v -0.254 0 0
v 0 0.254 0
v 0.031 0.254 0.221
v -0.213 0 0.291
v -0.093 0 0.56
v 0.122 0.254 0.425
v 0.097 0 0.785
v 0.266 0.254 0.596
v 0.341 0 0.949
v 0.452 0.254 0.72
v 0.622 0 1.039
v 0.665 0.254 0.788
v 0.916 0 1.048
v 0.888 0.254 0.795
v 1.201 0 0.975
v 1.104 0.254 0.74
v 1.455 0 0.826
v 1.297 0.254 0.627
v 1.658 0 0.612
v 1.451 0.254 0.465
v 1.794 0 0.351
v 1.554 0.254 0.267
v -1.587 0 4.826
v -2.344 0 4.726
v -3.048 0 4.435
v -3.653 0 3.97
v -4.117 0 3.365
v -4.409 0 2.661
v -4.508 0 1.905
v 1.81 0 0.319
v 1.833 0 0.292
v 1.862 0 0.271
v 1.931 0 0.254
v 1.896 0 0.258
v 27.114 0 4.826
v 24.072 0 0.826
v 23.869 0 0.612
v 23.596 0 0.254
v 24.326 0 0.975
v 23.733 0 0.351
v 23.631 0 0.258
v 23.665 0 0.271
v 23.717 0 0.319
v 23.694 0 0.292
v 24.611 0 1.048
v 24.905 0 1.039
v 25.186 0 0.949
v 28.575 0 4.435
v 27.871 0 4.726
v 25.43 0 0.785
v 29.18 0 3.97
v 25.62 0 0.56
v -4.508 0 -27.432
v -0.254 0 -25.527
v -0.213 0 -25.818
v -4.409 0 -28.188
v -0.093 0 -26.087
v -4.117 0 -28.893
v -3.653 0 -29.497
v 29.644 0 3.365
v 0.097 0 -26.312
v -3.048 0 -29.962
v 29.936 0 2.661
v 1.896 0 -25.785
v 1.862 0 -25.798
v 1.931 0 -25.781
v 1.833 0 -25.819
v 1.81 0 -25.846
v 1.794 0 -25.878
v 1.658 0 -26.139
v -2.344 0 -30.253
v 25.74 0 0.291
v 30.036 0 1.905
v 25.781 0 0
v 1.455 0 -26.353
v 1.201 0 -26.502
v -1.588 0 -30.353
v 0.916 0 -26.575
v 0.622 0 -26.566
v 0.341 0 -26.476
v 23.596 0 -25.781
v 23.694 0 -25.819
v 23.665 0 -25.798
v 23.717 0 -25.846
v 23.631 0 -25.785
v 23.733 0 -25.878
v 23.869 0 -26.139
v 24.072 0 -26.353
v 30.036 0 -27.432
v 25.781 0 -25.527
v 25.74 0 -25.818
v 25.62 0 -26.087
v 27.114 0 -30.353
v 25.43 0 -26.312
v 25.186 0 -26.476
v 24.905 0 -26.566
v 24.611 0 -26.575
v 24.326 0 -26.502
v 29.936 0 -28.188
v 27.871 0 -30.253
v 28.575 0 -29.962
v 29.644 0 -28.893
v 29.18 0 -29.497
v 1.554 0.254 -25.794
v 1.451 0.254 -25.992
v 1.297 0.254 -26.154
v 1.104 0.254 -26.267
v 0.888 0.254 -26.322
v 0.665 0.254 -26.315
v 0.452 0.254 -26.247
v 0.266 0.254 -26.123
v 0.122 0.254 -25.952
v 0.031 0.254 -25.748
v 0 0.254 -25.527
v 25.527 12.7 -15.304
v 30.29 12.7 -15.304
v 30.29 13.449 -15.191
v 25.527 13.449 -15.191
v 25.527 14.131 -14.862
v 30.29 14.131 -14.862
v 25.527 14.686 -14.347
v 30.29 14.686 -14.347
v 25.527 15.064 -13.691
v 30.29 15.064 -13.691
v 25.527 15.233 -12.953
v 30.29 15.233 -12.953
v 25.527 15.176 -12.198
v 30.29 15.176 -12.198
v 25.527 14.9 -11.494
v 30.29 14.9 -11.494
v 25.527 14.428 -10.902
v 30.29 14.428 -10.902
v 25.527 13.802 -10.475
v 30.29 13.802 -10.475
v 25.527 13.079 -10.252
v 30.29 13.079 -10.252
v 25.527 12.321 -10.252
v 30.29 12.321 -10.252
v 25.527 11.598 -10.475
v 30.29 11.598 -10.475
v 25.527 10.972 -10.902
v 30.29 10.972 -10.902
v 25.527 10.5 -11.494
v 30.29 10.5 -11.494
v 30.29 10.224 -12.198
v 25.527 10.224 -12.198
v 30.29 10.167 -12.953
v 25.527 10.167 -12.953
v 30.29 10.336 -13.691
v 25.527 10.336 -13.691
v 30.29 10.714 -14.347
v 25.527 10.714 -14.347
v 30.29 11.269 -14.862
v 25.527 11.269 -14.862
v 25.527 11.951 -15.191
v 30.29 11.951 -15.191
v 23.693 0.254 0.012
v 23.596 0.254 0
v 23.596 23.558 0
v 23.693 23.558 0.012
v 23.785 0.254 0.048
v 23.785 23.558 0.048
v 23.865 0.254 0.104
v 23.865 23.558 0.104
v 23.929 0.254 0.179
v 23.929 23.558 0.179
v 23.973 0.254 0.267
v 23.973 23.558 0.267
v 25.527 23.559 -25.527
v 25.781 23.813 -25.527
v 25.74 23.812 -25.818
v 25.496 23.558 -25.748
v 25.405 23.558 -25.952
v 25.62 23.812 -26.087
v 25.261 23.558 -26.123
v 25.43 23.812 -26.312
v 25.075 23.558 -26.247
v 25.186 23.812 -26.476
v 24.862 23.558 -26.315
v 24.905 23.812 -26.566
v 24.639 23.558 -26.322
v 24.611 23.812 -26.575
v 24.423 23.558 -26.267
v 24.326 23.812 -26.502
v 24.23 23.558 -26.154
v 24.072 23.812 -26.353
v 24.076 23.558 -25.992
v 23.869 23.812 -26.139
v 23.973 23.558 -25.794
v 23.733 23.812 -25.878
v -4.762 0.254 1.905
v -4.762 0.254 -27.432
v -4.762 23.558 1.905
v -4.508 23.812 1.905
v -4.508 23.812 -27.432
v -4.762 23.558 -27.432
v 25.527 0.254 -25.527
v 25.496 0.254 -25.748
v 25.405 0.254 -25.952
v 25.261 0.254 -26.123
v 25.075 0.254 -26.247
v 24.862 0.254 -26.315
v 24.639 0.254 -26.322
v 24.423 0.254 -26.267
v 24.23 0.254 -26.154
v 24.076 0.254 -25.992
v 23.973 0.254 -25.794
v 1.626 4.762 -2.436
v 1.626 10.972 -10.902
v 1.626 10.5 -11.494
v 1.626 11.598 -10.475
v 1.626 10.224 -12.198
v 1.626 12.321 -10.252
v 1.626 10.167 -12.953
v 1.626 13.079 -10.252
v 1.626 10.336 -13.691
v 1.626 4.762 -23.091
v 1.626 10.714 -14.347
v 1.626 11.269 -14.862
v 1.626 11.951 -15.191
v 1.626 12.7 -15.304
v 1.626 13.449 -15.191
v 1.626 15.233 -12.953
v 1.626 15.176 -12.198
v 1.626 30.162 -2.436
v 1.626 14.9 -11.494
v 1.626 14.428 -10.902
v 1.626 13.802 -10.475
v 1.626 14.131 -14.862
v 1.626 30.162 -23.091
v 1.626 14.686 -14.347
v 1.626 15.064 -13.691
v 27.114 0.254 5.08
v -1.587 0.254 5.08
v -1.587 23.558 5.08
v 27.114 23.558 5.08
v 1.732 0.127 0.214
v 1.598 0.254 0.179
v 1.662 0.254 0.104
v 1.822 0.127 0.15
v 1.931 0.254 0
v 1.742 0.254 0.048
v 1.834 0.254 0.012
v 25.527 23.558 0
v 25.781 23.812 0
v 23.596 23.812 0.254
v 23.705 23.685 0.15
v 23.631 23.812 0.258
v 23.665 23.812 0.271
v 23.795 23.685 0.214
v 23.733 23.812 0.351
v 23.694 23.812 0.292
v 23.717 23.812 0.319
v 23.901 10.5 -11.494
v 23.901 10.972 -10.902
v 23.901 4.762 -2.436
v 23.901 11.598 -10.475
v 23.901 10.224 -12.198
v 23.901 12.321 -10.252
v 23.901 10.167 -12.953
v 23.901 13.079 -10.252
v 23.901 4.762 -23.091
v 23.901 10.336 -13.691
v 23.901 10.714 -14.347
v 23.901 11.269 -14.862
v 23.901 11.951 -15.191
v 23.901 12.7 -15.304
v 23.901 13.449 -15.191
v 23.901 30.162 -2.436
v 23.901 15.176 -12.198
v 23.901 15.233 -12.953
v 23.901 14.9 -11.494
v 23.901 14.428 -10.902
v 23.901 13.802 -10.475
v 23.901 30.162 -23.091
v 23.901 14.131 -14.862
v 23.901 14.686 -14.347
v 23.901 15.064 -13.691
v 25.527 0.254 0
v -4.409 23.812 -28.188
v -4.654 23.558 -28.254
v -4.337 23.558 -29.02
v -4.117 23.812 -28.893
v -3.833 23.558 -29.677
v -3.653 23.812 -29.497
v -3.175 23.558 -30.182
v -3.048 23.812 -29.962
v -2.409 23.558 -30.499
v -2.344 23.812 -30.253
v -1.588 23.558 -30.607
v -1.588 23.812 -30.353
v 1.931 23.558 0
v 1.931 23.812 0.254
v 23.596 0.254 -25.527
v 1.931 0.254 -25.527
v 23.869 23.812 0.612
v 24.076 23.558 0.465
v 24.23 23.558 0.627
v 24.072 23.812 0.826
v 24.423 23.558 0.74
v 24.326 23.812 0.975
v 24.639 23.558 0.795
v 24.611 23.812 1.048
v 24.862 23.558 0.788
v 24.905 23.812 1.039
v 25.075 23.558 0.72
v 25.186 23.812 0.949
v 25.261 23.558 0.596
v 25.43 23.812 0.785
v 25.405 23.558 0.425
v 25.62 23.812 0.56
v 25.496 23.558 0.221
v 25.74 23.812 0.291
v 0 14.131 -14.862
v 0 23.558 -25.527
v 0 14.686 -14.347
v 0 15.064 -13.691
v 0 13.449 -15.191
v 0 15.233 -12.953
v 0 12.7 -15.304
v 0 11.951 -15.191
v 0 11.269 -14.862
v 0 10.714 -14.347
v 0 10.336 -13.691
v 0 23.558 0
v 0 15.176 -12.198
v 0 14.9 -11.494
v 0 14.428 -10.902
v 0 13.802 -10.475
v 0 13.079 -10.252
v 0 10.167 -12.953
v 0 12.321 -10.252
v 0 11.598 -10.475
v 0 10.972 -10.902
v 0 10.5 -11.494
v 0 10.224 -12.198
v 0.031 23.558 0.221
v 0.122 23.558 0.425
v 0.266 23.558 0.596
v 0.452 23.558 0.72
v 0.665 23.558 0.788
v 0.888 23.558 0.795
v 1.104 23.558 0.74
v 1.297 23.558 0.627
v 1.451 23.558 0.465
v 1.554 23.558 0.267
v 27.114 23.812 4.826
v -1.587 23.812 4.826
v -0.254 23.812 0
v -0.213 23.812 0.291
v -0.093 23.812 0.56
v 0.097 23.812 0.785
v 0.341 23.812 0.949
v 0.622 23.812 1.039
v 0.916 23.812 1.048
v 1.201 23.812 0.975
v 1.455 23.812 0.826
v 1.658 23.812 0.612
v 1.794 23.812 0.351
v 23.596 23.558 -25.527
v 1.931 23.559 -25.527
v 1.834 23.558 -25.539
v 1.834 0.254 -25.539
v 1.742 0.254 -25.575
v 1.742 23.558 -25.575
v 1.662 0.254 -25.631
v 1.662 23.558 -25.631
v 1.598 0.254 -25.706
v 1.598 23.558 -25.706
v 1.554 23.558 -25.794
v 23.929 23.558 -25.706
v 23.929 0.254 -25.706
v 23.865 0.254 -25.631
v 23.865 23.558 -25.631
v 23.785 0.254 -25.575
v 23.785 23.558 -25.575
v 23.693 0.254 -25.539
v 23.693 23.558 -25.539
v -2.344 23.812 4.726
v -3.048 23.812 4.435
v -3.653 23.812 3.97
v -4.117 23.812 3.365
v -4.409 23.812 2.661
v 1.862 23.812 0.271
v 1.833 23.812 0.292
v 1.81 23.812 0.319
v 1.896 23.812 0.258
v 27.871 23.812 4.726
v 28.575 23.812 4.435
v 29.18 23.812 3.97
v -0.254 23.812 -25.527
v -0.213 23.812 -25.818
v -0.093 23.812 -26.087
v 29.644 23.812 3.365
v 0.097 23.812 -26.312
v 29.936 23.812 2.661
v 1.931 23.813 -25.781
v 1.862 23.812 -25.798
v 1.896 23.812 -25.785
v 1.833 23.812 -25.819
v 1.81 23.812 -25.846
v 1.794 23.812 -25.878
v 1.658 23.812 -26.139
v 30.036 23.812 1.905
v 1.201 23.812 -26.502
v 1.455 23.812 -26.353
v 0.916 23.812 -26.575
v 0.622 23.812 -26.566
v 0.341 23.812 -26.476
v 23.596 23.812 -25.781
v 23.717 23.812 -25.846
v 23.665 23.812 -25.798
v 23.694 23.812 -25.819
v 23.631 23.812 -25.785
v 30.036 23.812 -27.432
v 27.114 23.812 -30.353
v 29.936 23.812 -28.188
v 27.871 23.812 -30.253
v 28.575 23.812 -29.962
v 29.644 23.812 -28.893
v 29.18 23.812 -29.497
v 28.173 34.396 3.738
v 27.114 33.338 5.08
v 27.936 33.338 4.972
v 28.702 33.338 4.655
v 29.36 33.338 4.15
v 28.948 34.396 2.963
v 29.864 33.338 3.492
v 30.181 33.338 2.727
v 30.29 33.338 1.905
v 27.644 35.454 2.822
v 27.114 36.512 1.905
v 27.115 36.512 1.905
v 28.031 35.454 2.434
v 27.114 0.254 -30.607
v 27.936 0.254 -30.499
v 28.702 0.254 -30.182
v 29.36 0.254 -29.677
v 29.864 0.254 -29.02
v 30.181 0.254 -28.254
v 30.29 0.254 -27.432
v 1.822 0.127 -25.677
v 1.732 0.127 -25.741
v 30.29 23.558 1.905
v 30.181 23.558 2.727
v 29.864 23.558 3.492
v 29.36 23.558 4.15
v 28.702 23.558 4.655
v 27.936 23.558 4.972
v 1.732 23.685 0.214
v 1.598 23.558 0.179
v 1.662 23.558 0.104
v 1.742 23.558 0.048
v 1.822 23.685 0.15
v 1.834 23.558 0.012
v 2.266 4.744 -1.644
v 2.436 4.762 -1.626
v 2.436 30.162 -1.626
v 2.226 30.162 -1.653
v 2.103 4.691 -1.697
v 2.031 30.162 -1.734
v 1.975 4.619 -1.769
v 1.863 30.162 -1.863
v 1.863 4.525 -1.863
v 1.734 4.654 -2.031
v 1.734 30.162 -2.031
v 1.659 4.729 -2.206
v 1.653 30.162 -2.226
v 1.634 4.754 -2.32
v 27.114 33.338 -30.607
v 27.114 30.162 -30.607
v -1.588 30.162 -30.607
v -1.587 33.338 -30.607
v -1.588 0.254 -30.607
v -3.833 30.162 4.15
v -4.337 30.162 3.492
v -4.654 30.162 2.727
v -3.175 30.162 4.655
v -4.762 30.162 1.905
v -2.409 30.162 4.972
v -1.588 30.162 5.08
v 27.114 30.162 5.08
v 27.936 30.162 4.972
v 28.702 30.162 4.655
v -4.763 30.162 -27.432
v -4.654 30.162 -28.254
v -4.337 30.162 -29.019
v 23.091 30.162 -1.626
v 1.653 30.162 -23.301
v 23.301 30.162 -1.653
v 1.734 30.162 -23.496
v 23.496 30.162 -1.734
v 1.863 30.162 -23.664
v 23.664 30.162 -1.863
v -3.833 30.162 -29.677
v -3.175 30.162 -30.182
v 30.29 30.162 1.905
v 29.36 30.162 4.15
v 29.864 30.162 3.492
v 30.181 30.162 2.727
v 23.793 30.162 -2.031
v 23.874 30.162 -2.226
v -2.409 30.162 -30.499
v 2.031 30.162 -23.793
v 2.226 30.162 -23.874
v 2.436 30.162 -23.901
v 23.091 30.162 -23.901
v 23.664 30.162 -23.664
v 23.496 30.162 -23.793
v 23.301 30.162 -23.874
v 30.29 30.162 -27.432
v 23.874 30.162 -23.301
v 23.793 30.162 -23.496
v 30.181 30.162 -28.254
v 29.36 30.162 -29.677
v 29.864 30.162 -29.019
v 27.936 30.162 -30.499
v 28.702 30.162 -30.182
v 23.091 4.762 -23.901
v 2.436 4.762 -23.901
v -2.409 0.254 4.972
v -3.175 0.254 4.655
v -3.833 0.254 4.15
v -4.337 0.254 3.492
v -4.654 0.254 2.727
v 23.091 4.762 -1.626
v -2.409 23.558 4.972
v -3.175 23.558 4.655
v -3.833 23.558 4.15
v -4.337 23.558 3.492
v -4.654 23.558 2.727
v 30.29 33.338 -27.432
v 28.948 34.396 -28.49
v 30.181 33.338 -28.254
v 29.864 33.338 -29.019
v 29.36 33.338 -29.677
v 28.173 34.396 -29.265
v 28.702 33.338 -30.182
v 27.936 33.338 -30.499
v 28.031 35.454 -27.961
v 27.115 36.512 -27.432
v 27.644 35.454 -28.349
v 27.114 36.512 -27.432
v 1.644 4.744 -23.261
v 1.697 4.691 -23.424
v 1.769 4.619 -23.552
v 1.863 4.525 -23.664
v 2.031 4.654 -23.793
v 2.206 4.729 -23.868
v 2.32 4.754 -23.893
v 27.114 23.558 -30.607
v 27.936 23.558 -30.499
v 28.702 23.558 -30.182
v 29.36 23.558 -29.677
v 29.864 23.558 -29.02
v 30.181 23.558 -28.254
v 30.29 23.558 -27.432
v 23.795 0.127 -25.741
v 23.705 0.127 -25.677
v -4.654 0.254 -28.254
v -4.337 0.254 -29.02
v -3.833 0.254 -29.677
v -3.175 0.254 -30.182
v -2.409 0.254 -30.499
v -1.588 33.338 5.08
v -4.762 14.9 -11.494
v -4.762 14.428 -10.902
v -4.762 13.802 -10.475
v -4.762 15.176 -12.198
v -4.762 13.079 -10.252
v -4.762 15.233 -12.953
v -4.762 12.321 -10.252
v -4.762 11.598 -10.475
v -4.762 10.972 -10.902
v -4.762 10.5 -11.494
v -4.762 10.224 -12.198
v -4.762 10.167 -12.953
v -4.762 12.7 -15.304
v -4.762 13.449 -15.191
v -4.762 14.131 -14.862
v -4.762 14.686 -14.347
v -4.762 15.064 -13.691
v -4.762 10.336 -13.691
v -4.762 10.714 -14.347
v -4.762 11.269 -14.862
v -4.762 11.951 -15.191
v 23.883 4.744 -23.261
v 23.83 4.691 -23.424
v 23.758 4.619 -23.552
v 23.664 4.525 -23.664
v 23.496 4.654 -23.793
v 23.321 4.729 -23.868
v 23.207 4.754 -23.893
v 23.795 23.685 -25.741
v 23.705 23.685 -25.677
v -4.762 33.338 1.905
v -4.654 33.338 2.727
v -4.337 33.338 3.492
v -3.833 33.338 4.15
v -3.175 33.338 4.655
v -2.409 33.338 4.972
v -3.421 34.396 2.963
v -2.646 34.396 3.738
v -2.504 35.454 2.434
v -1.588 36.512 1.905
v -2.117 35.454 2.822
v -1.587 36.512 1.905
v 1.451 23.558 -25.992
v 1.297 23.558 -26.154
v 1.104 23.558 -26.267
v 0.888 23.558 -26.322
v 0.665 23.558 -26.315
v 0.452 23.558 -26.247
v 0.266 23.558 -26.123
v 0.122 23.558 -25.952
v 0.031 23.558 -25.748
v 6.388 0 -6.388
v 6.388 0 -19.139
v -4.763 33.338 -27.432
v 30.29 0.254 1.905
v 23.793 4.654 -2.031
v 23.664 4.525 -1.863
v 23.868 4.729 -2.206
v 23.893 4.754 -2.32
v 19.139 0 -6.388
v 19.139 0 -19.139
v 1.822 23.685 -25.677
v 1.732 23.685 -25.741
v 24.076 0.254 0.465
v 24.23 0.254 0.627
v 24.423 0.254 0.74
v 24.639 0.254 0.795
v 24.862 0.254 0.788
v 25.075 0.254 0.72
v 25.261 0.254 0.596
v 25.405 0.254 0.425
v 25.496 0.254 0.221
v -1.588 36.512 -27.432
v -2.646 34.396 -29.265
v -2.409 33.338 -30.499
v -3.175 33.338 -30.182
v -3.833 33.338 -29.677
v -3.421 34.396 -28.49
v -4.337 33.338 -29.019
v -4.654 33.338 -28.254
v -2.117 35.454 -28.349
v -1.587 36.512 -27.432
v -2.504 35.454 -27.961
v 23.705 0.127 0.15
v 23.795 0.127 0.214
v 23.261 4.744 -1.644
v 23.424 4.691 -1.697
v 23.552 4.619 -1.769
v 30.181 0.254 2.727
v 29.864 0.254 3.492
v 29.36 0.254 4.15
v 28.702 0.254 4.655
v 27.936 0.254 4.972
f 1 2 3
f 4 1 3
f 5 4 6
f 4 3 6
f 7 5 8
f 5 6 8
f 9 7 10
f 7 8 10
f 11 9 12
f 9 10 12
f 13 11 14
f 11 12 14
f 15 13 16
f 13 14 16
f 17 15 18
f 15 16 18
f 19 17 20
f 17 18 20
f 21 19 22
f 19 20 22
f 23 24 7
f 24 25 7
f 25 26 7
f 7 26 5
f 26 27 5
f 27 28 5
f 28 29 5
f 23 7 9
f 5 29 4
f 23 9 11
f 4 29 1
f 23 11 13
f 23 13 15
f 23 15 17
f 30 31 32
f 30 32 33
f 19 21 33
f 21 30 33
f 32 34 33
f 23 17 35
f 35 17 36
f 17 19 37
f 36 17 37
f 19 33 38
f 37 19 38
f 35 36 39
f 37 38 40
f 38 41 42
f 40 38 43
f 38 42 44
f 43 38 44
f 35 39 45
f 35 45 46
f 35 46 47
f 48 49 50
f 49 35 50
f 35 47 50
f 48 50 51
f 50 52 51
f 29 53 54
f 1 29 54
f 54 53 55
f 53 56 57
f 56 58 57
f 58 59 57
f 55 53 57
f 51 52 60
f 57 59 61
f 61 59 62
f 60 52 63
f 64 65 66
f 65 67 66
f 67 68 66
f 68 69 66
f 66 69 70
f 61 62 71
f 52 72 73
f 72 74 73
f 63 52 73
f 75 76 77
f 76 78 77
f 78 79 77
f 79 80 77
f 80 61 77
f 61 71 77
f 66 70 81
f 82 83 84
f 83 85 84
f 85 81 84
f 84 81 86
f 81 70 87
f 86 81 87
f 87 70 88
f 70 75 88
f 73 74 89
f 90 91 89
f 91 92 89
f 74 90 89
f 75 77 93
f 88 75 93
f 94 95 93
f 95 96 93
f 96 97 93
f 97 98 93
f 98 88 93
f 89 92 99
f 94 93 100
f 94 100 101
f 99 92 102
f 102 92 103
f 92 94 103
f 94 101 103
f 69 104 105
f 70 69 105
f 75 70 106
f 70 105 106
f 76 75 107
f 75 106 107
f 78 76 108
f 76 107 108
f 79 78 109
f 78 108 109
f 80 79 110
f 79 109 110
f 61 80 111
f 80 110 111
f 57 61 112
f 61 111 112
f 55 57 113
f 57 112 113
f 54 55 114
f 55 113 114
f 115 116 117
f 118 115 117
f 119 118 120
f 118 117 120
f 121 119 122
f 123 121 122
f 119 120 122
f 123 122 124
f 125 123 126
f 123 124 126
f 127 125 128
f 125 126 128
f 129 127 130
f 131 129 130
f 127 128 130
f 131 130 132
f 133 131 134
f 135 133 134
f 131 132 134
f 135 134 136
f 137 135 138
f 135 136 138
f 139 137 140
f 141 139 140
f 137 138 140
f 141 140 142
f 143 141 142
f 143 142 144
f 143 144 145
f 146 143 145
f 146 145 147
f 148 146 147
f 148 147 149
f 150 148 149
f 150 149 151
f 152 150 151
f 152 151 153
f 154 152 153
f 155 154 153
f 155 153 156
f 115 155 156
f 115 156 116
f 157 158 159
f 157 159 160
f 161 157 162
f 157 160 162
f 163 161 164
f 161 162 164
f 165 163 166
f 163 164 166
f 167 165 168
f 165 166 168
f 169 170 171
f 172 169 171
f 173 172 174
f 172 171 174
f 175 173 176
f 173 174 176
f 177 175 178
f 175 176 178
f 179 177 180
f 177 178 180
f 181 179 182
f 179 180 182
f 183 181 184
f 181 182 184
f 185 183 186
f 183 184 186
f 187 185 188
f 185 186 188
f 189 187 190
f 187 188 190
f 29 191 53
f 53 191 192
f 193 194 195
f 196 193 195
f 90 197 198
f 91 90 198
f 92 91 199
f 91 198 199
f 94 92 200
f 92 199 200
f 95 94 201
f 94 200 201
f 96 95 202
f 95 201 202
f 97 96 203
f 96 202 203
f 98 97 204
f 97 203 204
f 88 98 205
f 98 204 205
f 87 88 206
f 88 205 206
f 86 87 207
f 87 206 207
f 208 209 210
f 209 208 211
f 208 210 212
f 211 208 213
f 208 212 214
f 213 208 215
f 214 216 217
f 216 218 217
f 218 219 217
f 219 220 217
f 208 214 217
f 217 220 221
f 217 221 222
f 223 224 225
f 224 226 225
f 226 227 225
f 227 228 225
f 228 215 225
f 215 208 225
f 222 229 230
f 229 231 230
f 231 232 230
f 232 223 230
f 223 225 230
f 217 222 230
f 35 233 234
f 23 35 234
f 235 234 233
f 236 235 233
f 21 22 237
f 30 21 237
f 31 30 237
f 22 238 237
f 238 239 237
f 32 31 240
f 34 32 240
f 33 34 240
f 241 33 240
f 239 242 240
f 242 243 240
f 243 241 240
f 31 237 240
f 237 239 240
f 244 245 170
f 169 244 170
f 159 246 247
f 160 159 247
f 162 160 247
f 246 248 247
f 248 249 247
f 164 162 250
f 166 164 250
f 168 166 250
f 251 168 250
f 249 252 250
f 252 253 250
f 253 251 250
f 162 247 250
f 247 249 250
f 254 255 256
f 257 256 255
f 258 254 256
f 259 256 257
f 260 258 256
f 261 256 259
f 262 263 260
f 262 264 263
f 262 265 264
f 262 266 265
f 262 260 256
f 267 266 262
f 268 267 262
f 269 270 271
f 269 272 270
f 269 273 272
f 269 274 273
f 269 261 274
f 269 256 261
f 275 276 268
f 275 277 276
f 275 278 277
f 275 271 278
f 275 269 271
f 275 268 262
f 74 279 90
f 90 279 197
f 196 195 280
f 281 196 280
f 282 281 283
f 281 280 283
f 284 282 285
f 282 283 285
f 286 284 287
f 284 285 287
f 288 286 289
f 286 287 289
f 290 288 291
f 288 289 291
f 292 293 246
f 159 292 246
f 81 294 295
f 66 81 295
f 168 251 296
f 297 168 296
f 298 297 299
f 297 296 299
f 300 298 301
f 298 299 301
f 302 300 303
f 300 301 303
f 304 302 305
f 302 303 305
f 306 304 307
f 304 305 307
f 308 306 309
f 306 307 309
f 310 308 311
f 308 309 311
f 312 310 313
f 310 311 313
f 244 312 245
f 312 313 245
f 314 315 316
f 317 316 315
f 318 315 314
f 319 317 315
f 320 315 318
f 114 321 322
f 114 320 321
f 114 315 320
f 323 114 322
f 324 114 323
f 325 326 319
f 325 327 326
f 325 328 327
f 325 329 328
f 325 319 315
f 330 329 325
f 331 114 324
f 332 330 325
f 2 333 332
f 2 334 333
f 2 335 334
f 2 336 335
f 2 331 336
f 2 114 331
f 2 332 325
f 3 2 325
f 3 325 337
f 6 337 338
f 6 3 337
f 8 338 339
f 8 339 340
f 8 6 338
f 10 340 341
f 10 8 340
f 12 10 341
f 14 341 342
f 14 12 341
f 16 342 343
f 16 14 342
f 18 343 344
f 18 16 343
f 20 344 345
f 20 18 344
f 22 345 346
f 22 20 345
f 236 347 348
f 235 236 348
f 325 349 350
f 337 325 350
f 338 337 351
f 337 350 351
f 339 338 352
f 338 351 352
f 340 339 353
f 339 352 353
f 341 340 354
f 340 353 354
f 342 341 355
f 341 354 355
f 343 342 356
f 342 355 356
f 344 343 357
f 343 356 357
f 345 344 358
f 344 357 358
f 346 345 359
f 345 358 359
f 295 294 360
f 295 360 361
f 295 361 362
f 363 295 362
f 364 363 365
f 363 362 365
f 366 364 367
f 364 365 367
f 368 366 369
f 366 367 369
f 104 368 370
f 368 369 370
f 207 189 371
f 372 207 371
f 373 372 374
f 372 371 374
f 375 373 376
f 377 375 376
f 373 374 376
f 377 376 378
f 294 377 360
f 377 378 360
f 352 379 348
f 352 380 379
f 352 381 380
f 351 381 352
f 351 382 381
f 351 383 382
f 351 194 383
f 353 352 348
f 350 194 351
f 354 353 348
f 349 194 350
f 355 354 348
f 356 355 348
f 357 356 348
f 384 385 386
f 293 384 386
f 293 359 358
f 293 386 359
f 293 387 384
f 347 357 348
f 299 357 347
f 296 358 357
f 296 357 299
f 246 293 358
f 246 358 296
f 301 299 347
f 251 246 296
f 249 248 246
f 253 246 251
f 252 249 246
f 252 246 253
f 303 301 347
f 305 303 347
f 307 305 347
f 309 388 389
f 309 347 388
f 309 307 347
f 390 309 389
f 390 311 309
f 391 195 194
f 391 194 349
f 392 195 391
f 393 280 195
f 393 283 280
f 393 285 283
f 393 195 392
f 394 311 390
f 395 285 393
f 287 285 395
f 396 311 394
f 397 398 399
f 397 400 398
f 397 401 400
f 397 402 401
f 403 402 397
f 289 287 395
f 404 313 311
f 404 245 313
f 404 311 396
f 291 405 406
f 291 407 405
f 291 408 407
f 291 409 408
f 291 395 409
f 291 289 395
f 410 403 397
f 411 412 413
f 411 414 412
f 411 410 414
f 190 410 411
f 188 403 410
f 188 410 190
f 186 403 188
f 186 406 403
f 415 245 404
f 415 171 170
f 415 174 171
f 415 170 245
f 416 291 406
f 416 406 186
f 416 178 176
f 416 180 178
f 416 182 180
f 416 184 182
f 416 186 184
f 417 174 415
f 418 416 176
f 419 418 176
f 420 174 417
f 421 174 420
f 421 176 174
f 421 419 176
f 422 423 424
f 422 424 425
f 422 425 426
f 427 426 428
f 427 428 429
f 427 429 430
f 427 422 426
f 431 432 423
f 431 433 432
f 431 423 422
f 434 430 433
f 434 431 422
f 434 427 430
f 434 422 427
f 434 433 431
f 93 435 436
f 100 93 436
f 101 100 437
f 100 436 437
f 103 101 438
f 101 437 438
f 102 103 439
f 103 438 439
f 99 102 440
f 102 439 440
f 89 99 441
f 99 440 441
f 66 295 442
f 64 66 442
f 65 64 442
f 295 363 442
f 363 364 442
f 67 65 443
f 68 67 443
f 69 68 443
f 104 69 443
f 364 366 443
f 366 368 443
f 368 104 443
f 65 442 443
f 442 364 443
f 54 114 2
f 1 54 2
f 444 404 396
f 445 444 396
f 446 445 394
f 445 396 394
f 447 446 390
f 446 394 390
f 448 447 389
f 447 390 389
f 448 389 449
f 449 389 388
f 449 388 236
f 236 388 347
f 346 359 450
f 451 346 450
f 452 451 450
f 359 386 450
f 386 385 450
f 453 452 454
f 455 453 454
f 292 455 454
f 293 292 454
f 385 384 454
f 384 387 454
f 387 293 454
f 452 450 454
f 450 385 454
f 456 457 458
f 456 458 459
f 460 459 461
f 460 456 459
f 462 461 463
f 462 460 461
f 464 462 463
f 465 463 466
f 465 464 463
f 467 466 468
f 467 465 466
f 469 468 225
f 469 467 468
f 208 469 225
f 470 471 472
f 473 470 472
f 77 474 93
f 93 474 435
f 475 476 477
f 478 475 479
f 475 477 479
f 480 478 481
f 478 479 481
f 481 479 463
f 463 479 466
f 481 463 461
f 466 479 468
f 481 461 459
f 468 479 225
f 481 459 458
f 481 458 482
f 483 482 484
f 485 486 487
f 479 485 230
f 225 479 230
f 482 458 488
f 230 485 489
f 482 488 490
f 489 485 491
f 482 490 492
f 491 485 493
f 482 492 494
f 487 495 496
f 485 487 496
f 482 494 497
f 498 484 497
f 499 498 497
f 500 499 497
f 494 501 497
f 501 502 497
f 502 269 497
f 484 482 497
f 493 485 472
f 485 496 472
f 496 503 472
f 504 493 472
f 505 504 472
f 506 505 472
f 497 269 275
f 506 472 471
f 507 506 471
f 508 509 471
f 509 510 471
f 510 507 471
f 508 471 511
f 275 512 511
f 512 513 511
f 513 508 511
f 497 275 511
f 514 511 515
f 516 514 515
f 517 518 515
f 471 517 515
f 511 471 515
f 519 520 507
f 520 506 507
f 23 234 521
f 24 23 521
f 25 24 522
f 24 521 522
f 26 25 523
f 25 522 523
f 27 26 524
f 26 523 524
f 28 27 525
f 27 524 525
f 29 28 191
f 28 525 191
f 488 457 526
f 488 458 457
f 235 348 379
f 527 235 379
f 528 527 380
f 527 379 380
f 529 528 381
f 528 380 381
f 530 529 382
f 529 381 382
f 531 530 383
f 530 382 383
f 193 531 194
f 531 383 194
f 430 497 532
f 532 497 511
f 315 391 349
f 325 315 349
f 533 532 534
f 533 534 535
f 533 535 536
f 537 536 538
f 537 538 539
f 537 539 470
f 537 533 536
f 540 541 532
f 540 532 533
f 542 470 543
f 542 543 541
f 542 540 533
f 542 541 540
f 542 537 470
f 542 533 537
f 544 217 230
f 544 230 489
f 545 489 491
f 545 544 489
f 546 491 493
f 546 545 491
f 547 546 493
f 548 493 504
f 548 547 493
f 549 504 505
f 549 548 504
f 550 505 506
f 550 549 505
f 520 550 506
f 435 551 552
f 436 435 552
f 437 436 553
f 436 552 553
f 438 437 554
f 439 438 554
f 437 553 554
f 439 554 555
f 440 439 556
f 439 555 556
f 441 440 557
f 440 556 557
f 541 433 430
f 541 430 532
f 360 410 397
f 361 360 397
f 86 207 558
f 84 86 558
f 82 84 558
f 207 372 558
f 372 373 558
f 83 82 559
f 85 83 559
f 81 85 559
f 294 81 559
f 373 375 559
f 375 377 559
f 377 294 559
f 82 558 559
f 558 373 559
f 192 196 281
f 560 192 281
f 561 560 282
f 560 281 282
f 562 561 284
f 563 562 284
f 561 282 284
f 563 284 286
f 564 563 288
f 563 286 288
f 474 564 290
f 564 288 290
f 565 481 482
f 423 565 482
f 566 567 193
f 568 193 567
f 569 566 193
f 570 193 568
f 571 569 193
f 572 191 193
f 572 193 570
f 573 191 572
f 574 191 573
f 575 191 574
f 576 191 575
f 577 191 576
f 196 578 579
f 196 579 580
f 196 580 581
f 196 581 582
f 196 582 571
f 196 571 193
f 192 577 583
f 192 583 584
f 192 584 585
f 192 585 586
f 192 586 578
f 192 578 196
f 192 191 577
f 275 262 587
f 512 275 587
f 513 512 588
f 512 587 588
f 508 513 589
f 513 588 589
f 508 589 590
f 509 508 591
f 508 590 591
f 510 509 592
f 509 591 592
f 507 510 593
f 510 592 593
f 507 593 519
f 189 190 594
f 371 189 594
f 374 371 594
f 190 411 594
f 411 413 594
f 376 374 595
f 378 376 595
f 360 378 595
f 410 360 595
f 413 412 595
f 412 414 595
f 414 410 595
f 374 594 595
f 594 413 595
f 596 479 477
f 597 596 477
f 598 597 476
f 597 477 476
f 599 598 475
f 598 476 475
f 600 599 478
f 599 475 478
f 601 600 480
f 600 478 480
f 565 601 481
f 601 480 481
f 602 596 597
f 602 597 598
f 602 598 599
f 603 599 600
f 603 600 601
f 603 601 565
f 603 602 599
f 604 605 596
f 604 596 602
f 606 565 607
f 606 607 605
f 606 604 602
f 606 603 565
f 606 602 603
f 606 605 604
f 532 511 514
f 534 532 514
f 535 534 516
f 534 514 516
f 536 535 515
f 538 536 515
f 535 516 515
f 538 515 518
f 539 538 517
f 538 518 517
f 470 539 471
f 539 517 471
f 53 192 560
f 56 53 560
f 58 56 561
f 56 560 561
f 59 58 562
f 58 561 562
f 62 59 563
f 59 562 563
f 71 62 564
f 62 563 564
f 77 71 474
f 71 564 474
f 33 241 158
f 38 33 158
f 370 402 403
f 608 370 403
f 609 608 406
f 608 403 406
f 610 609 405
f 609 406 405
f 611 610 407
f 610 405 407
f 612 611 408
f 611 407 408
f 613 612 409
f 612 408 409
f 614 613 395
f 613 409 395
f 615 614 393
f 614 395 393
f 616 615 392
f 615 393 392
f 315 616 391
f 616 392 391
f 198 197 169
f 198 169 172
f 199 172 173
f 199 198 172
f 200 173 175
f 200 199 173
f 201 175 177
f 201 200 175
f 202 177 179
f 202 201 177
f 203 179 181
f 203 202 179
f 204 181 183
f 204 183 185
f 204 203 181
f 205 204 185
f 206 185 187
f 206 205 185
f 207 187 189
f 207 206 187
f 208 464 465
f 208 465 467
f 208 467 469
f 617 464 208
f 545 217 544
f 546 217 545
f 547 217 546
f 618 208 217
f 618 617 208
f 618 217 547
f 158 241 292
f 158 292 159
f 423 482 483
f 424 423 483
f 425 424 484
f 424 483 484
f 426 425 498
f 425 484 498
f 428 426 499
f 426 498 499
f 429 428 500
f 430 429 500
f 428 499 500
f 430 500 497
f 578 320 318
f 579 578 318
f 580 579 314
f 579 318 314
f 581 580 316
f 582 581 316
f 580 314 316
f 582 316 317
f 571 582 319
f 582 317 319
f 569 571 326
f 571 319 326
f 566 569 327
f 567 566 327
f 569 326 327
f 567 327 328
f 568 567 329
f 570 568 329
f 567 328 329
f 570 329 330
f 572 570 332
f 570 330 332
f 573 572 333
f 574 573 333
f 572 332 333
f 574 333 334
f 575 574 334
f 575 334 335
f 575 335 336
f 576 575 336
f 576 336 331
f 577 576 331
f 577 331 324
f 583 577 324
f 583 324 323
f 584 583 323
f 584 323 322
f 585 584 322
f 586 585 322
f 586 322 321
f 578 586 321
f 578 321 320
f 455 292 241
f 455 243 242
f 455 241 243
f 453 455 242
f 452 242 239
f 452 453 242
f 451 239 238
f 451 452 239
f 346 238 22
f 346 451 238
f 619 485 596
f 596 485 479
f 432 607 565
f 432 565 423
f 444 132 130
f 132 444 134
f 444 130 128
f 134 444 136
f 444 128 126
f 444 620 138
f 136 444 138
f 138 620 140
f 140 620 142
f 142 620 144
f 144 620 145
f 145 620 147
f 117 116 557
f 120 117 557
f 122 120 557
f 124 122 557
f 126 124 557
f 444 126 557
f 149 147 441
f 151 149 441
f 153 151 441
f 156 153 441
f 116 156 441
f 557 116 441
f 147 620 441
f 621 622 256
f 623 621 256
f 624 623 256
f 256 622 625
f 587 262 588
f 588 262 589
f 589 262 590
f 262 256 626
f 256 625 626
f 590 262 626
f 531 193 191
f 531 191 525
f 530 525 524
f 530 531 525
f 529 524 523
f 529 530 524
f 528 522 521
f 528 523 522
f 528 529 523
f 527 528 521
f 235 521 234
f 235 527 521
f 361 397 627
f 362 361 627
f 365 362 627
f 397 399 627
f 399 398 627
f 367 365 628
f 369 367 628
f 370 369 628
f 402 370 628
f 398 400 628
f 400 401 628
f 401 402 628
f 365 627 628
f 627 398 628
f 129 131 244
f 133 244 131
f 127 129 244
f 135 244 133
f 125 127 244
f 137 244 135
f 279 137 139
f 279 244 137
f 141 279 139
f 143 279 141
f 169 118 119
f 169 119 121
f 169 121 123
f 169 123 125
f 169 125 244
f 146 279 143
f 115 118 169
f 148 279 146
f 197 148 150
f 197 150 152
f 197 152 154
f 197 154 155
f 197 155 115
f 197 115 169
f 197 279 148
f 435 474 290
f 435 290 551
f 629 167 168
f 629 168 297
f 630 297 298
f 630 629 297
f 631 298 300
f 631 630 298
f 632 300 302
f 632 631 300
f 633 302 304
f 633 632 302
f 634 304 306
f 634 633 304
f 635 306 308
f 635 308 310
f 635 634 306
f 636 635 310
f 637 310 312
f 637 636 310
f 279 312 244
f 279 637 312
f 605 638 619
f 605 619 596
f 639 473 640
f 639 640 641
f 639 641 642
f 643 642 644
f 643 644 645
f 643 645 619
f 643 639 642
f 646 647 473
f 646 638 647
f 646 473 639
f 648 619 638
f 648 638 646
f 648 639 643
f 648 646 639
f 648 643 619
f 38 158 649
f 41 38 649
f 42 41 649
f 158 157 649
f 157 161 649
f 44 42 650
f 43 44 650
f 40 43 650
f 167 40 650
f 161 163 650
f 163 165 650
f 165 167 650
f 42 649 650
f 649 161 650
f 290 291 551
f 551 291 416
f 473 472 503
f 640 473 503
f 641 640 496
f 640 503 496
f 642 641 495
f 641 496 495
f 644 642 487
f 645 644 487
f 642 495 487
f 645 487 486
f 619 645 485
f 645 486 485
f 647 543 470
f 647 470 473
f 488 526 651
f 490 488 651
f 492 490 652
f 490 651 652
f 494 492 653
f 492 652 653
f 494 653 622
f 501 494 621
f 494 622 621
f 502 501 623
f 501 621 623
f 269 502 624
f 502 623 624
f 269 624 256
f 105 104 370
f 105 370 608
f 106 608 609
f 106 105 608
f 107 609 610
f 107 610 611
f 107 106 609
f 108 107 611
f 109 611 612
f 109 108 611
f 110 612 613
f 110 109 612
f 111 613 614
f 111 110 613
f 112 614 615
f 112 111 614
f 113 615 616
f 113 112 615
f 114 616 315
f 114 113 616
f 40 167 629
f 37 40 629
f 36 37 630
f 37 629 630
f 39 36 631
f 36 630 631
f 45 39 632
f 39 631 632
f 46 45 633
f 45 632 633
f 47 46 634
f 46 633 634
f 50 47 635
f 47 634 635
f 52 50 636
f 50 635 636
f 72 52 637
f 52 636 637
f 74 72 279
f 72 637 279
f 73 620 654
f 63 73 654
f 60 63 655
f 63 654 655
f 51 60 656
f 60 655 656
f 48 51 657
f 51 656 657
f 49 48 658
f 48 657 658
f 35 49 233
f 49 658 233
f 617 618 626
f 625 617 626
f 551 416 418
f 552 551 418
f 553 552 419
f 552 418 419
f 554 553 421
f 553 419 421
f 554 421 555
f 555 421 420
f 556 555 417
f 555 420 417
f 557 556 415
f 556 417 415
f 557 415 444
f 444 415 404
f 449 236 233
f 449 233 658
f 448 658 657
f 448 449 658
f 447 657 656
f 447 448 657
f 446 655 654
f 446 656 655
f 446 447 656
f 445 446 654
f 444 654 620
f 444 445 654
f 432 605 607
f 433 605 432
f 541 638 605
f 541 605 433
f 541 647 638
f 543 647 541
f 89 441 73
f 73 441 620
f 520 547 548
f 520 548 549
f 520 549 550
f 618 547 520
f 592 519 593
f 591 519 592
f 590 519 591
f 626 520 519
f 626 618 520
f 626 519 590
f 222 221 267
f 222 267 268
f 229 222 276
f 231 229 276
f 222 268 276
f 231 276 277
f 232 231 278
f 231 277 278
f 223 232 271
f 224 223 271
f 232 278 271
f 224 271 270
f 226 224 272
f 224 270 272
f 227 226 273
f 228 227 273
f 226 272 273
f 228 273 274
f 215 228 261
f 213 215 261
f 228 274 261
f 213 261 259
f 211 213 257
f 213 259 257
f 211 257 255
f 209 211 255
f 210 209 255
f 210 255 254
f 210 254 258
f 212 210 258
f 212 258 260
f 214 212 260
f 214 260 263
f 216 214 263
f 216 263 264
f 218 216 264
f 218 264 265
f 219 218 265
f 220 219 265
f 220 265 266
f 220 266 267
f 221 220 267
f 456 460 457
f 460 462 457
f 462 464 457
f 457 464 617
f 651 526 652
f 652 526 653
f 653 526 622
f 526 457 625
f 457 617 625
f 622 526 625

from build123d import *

# Parameters (mm, degrees)
SKETCH1_W           = 35.052
SKETCH1_H           = 35.687
BOSS_EXTRUDE1_DEPTH = 23.8125
FILLET1_R           = 3.175
FILLET2_R           = 0.4
SKETCH2_W           = 22.2758
SKETCH2_H           = 22.2758
BOSS_EXTRUDE2_DEPTH = 6.35
SKETCH2_4_W         = 22.2758
SKETCH2_4_H         = 22.2758
BOSS_EXTRUDE3_DEPTH = 30.1625
CHAMFER1_SIZE       = 3.175
CHAMFER2_SIZE       = 4.7625
CHAMFER3_SIZE       = 0.254
FILLET3_R           = 0.810638298
SKETCH3_R           = 2.54
CUT_EXTRUDE1_DEPTH  = 60.148912156


with BuildPart() as part:
    # Sketch1 → Boss-Extrude1 (new body)
    with BuildSketch(Plane(origin=(0, 0, 0), x_dir=(1, 0, 0), z_dir=(0, 1, 0))):
        with Locations((12.7635, 12.7635)):
            Rectangle(SKETCH1_W, SKETCH1_H)
        with BuildLine():
            Line((1.599999848, 0), (23.927000152, 0))
            ThreePointArc((23.927000152, 0), (24.727000076, -0.799999924), (25.527, 0))
            Line((25.527, 0), (25.527, 25.527))
            ThreePointArc((25.527, 25.527), (24.727000076, 26.326999924), (23.927000152, 25.527))
            Line((23.927000152, 25.527), (1.599999848, 25.527))
            ThreePointArc((1.599999848, 25.527), (0.799999924, 26.326999924), (0, 25.527))
            Line((0, 25.527), (0, 0))
            ThreePointArc((0, 0), (0.799999924, -0.799999924), (1.599999848, 0))
        make_face(mode=Mode.SUBTRACT)
    extrude(amount=BOSS_EXTRUDE1_DEPTH)

    # Fillet1
    fillet1_edges = [part.edges().sort_by_distance(p)[0] for p in [
        (-4.7625, 11.90625, -30.607),
        (30.2895, 11.90625, -30.607),
        (30.2895, 11.90625, 5.08),
        (-4.7625, 11.90625, 5.08),
    ]]
    fillet(fillet1_edges, radius=FILLET1_R)

    # Fillet2
    fillet2_edges = [part.edges().sort_by_distance(p)[0] for p in [
        (1.599999848, 11.90625, 0),
        (23.927000152, 11.90625, 0),
        (23.927000152, 11.90625, -25.527),
        (1.599999848, 11.90625, -25.527),
    ]]
    fillet(fillet2_edges, radius=FILLET2_R)

    # Chamfer3
    chamfer3_edges = [part.edges().sort_by_distance(p)[0] for p in [
        (0.664718345, 0, 0.788478771),
        (25.527, 0, -12.7635),
        (24.862281655, 0, -26.315478771),
        (0, 0, -12.7635),
        (0.664718345, 23.8125, 0.788478771),
        (25.527, 23.8125, -12.7635),
        (24.862281655, 23.8125, -26.315478771),
        (0, 23.8125, -12.7635),
        (-4.7625, 0, -12.7635),
        (-4.7625, 23.8125, -12.7635),
        (12.7635, 0, -30.607),
        (30.2895, 0, -12.7635),
        (12.7635, 0, 5.08),
        (-3.83256403, 0, 4.15006403),
        (29.35956403, 0, 4.15006403),
        (29.35956403, 0, -29.67706403),
        (-3.83256403, 0, -29.67706403),
        (12.7635, 23.8125, -30.607),
        (12.7635, 23.8125, 5.08),
        (30.2895, 23.8125, -12.7635),
        (-3.83256403, 23.8125, 4.15006403),
        (29.35956403, 23.8125, 4.15006403),
        (29.35956403, 23.8125, -29.67706403),
        (-3.83256403, 23.8125, -29.67706403),
        (12.7635, 0, 0),
        (12.7635, 23.8125, 0),
        (24.862281655, 0, 0.788478771),
        (12.7635, 0, -25.527),
        (0.664718345, 0, -26.315478771),
        (1.700430589, 0, 0.073401365),
        (1.700430589, 0, -25.600401365),
        (23.826569411, 0, -25.600401365),
        (23.826569411, 0, 0.073401365),
        (24.862281655, 23.8125, 0.788478771),
        (0.664718345, 23.8125, -26.315478771),
        (12.7635, 23.8125, -25.527),
        (1.700430589, 23.8125, 0.073401365),
        (1.700430589, 23.8125, -25.600401365),
        (23.826569411, 23.8125, -25.600401365),
        (23.826569411, 23.8125, 0.073401365),
    ]]
    chamfer(chamfer3_edges, length=CHAMFER3_SIZE)


with BuildPart() as body_2:
    # Sketch2 → Boss-Extrude2 (new body)
    # profile 1 of 2: a face of its own
    with BuildSketch(Plane(origin=(0, 30.1625, 0), x_dir=(1, 0, 0), z_dir=(0, 1, 0))):
        with BuildLine():
            Line((30.2895, -1.905), (30.2895, 27.432))
            ThreePointArc((30.2895, 27.432), (29.35956403, 29.67706403), (27.1145, 30.607))
            Line((27.1145, 30.607), (-1.5875, 30.607))
            ThreePointArc((-1.5875, 30.607), (-3.83256403, 29.67706403), (-4.7625, 27.432))
            Line((-4.7625, 27.432), (-4.7625, -1.905))
            ThreePointArc((-4.7625, -1.905), (-3.83256403, -4.15006403), (-1.5875, -5.08))
            Line((-1.5875, -5.08), (27.1145, -5.08))
            ThreePointArc((27.1145, -5.08), (29.35956403, -4.15006403), (30.2895, -1.905))
        make_face()
        with Locations((12.7635, 12.7635)):
            Rectangle(SKETCH2_W, SKETCH2_H, mode=Mode.SUBTRACT)
    # profile 2 of 2: a face of its own
    with BuildSketch(Plane(origin=(0, 30.1625, 0), x_dir=(1, 0, 0), z_dir=(0, 1, 0))):
        with Locations((12.7635, 12.7635)):
            Rectangle(SKETCH2_W, SKETCH2_H)
    extrude(amount=BOSS_EXTRUDE2_DEPTH)

    # Sketch2<4> → Boss-Extrude3 (add)
    with BuildSketch(Plane(origin=(0, 30.1625, 0), x_dir=(1, 0, 0), z_dir=(0, 1, 0))):
        with Locations((12.7635, 12.7635)):
            Rectangle(SKETCH2_4_W, SKETCH2_4_H)
    extrude(amount=-BOSS_EXTRUDE3_DEPTH)

    # Chamfer1
    chamfer1_edges = [body_2.edges().sort_by_distance(p)[0] for p in [
        (29.35956403, 36.5125, -29.67706403),
        (12.7635, 36.5125, -30.607),
        (-3.83256403, 36.5125, -29.67706403),
        (-4.7625, 36.5125, -12.7635),
        (-3.83256403, 36.5125, 4.15006403),
        (12.7635, 36.5125, 5.08),
        (29.35956403, 36.5125, 4.15006403),
        (30.2895, 36.5125, -12.7635),
    ]]
    chamfer(chamfer1_edges, length=CHAMFER1_SIZE - 0.0001)  # a hair under: the kernel refuses the full size

    # Chamfer2
    chamfer2_edges = [body_2.edges().sort_by_distance(p)[0] for p in [
        (1.6256, 0, -12.7635),
        (12.7635, 0, -23.9014),
        (23.9014, 0, -12.7635),
        (12.7635, 0, -1.6256),
    ]]
    chamfer(chamfer2_edges, length=CHAMFER2_SIZE)

    # Fillet3
    fillet3_edges = [body_2.edges().sort_by_distance(p)[0] for p in [
        (1.6256, 17.4625, -23.9014),
        (1.6256, 17.4625, -1.6256),
        (23.9014, 17.4625, -1.6256),
        (23.9014, 17.4625, -23.9014),
    ]]
    fillet(fillet3_edges, radius=FILLET3_R)


with BuildPart() as cut_extrude1_tool:
    # Sketch3 → Cut-Extrude1 (new, through all)
    with BuildSketch(Plane(origin=(30.2895, 0, 0), x_dir=(0, 0, -1), z_dir=(1, 0, 0))):
        with Locations((12.7635, 12.7)):
            Circle(SKETCH3_R)
    extrude(amount=-CUT_EXTRUDE1_DEPTH)


with BuildPart() as part_1:
    add(part.part)

    # Cut-Extrude1: cut by cut_extrude1_tool
    add(cut_extrude1_tool.part, mode=Mode.SUBTRACT)


with BuildPart() as body_2_1:
    add(body_2.part)

    # Cut-Extrude1: cut by cut_extrude1_tool
    add(cut_extrude1_tool.part, mode=Mode.SUBTRACT)


solid = Compound([part_1.part, body_2_1.part])
